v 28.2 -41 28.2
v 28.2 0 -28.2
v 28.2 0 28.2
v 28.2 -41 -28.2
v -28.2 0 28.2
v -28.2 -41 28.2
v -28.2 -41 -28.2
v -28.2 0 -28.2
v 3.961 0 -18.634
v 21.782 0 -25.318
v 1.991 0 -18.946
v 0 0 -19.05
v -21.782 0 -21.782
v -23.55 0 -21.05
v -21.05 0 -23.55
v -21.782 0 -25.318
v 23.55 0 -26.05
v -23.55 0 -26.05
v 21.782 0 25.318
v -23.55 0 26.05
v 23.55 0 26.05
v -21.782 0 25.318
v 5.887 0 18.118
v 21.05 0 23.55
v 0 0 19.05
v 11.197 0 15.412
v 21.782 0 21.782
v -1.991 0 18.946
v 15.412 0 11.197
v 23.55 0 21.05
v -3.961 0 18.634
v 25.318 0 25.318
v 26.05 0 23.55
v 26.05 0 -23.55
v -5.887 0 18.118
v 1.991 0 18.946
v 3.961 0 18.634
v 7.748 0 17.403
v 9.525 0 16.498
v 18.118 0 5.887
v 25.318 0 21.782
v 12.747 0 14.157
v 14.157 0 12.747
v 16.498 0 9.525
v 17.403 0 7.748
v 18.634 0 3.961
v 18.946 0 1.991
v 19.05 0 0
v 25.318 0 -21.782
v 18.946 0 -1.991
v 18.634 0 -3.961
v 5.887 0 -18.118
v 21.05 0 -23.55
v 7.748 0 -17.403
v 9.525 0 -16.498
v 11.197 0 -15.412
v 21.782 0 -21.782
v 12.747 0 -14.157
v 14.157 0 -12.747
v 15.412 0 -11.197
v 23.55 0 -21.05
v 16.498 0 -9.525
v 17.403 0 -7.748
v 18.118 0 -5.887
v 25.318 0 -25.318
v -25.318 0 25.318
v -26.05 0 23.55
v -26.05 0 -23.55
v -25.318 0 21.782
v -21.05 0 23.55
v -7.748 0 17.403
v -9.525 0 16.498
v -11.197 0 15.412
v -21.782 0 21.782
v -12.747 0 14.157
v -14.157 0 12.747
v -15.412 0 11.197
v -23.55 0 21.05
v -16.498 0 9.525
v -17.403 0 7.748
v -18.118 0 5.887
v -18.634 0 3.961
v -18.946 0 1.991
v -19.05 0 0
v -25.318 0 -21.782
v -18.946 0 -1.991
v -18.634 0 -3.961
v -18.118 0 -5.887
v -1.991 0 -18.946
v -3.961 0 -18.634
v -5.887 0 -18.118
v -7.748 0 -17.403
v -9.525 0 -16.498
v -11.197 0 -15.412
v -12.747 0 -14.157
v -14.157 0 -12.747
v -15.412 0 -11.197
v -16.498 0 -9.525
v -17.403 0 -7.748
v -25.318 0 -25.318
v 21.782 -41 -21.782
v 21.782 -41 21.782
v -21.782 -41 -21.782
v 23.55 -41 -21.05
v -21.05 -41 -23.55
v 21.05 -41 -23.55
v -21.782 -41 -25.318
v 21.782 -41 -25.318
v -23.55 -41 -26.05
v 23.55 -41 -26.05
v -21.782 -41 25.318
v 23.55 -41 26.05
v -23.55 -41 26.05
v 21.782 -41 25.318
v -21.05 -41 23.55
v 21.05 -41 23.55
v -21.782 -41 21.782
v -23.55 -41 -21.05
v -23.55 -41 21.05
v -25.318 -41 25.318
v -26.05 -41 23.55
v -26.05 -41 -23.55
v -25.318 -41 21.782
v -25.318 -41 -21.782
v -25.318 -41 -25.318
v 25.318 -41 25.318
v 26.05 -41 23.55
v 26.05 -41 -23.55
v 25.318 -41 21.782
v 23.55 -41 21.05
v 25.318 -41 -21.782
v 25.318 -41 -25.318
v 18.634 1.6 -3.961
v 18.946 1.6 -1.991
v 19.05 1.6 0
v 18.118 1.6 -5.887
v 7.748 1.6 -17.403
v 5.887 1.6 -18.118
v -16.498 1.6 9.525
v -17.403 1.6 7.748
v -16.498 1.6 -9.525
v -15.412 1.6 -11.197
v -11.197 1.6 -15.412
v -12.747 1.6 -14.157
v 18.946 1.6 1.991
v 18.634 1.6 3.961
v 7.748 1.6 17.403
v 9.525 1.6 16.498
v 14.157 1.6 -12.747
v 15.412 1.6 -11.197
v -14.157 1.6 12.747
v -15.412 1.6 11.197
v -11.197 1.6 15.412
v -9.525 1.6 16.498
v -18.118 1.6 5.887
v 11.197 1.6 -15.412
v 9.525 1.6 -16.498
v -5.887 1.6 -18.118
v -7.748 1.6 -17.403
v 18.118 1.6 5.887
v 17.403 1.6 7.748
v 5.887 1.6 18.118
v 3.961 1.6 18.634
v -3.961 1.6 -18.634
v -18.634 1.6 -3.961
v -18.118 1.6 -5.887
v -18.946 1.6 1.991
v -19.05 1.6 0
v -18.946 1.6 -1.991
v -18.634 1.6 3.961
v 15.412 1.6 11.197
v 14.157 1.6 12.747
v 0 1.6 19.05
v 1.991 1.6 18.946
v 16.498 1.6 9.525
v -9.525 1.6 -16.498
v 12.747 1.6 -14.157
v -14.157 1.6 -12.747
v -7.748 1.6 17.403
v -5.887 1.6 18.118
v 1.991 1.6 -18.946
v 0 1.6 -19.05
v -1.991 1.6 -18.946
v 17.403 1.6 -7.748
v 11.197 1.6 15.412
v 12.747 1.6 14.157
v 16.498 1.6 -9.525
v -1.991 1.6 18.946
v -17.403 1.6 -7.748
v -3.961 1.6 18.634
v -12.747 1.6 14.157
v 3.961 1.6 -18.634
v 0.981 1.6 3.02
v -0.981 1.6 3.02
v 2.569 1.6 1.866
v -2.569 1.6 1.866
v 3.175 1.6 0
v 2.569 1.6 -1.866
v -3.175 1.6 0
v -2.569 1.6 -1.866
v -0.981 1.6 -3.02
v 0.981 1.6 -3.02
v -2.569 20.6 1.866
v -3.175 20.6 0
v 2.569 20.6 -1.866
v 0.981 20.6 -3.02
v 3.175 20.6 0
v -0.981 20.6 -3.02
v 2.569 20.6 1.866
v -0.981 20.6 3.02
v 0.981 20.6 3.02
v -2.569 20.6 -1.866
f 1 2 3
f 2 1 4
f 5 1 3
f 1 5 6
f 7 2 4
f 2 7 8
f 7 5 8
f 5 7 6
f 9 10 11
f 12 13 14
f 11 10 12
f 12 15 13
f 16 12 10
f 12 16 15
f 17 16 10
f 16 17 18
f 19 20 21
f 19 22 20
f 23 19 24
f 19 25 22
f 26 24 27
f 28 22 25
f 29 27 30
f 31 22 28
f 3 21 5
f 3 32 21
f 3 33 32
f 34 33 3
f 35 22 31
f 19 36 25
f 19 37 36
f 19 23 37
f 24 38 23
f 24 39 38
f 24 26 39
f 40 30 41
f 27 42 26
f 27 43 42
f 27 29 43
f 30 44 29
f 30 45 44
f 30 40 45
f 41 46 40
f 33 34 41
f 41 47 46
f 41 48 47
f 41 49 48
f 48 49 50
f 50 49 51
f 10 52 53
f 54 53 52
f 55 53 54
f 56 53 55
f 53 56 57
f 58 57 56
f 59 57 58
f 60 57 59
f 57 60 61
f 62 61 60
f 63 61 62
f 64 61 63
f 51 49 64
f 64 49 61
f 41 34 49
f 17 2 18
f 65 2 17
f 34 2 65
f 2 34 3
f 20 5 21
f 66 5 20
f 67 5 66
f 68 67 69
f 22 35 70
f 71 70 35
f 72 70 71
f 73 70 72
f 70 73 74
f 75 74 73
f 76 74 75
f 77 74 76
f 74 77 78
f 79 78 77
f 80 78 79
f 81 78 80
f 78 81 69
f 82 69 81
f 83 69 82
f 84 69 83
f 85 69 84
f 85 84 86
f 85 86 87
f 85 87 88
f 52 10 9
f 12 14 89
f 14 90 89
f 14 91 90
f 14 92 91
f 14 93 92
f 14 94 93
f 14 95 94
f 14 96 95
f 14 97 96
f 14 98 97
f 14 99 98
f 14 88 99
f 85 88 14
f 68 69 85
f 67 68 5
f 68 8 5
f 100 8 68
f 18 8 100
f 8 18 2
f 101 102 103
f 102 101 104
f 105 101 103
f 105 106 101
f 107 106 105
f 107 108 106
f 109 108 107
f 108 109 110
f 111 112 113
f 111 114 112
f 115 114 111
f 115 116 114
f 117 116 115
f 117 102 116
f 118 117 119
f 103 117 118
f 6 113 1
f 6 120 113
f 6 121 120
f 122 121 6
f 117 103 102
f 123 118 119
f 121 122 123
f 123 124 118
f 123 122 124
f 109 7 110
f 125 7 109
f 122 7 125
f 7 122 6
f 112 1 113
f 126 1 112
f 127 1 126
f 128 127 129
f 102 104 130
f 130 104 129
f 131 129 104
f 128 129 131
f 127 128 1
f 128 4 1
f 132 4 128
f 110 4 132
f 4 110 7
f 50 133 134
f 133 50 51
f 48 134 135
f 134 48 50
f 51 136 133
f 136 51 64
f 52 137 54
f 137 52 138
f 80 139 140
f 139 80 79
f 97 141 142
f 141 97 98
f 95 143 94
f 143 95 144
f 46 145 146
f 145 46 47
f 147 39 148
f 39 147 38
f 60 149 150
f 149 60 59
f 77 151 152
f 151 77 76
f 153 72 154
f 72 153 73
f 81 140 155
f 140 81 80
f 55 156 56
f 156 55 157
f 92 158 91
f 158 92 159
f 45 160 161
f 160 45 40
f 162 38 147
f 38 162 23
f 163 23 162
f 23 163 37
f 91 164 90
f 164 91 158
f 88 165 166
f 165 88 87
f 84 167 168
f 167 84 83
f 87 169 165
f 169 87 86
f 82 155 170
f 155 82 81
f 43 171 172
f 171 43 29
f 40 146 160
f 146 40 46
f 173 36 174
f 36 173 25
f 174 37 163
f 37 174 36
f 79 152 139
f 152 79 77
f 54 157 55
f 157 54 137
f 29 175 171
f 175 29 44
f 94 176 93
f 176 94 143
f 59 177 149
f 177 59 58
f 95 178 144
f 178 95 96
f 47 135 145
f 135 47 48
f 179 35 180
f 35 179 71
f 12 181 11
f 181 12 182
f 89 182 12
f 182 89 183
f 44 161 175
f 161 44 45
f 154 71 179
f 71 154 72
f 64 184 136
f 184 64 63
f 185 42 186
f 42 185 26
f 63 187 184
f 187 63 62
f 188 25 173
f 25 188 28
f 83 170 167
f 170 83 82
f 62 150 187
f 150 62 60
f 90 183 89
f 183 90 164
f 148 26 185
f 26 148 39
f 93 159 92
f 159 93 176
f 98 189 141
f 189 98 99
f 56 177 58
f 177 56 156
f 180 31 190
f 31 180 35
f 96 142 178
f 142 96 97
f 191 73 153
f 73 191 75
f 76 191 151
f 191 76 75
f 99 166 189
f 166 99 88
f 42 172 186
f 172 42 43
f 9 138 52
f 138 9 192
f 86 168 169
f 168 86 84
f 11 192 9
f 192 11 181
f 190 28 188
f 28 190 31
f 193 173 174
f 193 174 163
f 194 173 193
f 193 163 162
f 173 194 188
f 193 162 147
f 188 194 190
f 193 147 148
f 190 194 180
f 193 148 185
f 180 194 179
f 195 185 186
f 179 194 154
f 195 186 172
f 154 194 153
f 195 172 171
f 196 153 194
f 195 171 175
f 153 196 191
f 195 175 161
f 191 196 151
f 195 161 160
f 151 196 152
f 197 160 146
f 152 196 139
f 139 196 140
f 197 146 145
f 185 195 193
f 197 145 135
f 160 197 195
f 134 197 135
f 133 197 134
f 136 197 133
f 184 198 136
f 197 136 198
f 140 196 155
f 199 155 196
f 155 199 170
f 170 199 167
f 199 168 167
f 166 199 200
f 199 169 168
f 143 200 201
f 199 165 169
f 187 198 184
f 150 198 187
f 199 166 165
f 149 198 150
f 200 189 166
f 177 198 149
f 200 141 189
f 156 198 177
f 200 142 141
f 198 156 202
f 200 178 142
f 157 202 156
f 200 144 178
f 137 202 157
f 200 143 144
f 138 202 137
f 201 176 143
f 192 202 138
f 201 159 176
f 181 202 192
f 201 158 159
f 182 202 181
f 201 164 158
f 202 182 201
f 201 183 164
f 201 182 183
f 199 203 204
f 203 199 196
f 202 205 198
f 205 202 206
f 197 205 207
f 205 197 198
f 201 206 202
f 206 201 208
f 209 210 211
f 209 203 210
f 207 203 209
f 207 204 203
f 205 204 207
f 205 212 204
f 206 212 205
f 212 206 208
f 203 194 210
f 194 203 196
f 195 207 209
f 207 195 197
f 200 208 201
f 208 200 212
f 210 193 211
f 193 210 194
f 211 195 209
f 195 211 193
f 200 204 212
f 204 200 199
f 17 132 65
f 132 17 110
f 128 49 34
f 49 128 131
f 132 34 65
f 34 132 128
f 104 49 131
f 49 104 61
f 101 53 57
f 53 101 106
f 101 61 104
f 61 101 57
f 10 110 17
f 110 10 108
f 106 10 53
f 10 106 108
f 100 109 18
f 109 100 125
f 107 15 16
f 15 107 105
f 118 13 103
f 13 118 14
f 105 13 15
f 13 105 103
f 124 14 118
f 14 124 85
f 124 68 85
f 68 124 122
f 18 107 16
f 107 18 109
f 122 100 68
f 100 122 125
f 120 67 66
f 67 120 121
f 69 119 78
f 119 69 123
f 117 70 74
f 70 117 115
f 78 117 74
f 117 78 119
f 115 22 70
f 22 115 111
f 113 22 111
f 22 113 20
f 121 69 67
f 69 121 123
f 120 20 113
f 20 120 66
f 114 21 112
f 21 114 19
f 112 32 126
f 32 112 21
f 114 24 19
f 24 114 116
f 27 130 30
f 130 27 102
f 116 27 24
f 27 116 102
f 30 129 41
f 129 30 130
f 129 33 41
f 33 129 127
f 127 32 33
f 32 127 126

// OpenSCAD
// Motor measurements:
// * exterior dimensions (all +/- 1mm?)
// ** 56.4 mm tall
// ** 56.4 mm wide
// ** 41 mm deep
// * extruded disc on shaft side: 1.6mm deep, 38.1+/-0.03 diameter
// * shaft:
// ** 6.35mm diameter
// ** 20.6mm long
// * holes:
// ** 5mm diameter
// ** 47.1mm apart

// aligned with center of face at origin, shaft pointing
// in the +Y direction

overlap = 0.05;

module nema23_stepper() {
    $fa = 6;
    body = [56.4,41,56.4];
    disc_dia = 38.1;
    disc_depth = 1.6;
    shaft_dia = 6.35;
    shaft_len = 20.6;
    hole_dia = 5;
    hole_distance = 47.1;
    i = hole_distance / sqrt(2);
    difference() {
	union() {
	    // body block
	    translate([0,-body[1]/2,0]) cube(size=body,center=true);
	    // extruded disc
	    translate([0,-overlap,0]) rotate([-90,0,0])
	    cylinder(d=disc_dia,h=disc_depth+overlap);
	    // shaft
	    translate([0,-overlap,0]) rotate([-90,0,0])
	    cylinder(d=shaft_dia,h=shaft_len+overlap);
	}
	// subtract mounting holes
	for (a = [45,135,225,315]) {
	    rotate([0,a,0])
	    translate([i,overlap/2,0]) rotate([90,0,0]) cylinder(d=hole_dia,h=body[1]+overlap);
	}
    }
}

// Render
nema23_stepper();
